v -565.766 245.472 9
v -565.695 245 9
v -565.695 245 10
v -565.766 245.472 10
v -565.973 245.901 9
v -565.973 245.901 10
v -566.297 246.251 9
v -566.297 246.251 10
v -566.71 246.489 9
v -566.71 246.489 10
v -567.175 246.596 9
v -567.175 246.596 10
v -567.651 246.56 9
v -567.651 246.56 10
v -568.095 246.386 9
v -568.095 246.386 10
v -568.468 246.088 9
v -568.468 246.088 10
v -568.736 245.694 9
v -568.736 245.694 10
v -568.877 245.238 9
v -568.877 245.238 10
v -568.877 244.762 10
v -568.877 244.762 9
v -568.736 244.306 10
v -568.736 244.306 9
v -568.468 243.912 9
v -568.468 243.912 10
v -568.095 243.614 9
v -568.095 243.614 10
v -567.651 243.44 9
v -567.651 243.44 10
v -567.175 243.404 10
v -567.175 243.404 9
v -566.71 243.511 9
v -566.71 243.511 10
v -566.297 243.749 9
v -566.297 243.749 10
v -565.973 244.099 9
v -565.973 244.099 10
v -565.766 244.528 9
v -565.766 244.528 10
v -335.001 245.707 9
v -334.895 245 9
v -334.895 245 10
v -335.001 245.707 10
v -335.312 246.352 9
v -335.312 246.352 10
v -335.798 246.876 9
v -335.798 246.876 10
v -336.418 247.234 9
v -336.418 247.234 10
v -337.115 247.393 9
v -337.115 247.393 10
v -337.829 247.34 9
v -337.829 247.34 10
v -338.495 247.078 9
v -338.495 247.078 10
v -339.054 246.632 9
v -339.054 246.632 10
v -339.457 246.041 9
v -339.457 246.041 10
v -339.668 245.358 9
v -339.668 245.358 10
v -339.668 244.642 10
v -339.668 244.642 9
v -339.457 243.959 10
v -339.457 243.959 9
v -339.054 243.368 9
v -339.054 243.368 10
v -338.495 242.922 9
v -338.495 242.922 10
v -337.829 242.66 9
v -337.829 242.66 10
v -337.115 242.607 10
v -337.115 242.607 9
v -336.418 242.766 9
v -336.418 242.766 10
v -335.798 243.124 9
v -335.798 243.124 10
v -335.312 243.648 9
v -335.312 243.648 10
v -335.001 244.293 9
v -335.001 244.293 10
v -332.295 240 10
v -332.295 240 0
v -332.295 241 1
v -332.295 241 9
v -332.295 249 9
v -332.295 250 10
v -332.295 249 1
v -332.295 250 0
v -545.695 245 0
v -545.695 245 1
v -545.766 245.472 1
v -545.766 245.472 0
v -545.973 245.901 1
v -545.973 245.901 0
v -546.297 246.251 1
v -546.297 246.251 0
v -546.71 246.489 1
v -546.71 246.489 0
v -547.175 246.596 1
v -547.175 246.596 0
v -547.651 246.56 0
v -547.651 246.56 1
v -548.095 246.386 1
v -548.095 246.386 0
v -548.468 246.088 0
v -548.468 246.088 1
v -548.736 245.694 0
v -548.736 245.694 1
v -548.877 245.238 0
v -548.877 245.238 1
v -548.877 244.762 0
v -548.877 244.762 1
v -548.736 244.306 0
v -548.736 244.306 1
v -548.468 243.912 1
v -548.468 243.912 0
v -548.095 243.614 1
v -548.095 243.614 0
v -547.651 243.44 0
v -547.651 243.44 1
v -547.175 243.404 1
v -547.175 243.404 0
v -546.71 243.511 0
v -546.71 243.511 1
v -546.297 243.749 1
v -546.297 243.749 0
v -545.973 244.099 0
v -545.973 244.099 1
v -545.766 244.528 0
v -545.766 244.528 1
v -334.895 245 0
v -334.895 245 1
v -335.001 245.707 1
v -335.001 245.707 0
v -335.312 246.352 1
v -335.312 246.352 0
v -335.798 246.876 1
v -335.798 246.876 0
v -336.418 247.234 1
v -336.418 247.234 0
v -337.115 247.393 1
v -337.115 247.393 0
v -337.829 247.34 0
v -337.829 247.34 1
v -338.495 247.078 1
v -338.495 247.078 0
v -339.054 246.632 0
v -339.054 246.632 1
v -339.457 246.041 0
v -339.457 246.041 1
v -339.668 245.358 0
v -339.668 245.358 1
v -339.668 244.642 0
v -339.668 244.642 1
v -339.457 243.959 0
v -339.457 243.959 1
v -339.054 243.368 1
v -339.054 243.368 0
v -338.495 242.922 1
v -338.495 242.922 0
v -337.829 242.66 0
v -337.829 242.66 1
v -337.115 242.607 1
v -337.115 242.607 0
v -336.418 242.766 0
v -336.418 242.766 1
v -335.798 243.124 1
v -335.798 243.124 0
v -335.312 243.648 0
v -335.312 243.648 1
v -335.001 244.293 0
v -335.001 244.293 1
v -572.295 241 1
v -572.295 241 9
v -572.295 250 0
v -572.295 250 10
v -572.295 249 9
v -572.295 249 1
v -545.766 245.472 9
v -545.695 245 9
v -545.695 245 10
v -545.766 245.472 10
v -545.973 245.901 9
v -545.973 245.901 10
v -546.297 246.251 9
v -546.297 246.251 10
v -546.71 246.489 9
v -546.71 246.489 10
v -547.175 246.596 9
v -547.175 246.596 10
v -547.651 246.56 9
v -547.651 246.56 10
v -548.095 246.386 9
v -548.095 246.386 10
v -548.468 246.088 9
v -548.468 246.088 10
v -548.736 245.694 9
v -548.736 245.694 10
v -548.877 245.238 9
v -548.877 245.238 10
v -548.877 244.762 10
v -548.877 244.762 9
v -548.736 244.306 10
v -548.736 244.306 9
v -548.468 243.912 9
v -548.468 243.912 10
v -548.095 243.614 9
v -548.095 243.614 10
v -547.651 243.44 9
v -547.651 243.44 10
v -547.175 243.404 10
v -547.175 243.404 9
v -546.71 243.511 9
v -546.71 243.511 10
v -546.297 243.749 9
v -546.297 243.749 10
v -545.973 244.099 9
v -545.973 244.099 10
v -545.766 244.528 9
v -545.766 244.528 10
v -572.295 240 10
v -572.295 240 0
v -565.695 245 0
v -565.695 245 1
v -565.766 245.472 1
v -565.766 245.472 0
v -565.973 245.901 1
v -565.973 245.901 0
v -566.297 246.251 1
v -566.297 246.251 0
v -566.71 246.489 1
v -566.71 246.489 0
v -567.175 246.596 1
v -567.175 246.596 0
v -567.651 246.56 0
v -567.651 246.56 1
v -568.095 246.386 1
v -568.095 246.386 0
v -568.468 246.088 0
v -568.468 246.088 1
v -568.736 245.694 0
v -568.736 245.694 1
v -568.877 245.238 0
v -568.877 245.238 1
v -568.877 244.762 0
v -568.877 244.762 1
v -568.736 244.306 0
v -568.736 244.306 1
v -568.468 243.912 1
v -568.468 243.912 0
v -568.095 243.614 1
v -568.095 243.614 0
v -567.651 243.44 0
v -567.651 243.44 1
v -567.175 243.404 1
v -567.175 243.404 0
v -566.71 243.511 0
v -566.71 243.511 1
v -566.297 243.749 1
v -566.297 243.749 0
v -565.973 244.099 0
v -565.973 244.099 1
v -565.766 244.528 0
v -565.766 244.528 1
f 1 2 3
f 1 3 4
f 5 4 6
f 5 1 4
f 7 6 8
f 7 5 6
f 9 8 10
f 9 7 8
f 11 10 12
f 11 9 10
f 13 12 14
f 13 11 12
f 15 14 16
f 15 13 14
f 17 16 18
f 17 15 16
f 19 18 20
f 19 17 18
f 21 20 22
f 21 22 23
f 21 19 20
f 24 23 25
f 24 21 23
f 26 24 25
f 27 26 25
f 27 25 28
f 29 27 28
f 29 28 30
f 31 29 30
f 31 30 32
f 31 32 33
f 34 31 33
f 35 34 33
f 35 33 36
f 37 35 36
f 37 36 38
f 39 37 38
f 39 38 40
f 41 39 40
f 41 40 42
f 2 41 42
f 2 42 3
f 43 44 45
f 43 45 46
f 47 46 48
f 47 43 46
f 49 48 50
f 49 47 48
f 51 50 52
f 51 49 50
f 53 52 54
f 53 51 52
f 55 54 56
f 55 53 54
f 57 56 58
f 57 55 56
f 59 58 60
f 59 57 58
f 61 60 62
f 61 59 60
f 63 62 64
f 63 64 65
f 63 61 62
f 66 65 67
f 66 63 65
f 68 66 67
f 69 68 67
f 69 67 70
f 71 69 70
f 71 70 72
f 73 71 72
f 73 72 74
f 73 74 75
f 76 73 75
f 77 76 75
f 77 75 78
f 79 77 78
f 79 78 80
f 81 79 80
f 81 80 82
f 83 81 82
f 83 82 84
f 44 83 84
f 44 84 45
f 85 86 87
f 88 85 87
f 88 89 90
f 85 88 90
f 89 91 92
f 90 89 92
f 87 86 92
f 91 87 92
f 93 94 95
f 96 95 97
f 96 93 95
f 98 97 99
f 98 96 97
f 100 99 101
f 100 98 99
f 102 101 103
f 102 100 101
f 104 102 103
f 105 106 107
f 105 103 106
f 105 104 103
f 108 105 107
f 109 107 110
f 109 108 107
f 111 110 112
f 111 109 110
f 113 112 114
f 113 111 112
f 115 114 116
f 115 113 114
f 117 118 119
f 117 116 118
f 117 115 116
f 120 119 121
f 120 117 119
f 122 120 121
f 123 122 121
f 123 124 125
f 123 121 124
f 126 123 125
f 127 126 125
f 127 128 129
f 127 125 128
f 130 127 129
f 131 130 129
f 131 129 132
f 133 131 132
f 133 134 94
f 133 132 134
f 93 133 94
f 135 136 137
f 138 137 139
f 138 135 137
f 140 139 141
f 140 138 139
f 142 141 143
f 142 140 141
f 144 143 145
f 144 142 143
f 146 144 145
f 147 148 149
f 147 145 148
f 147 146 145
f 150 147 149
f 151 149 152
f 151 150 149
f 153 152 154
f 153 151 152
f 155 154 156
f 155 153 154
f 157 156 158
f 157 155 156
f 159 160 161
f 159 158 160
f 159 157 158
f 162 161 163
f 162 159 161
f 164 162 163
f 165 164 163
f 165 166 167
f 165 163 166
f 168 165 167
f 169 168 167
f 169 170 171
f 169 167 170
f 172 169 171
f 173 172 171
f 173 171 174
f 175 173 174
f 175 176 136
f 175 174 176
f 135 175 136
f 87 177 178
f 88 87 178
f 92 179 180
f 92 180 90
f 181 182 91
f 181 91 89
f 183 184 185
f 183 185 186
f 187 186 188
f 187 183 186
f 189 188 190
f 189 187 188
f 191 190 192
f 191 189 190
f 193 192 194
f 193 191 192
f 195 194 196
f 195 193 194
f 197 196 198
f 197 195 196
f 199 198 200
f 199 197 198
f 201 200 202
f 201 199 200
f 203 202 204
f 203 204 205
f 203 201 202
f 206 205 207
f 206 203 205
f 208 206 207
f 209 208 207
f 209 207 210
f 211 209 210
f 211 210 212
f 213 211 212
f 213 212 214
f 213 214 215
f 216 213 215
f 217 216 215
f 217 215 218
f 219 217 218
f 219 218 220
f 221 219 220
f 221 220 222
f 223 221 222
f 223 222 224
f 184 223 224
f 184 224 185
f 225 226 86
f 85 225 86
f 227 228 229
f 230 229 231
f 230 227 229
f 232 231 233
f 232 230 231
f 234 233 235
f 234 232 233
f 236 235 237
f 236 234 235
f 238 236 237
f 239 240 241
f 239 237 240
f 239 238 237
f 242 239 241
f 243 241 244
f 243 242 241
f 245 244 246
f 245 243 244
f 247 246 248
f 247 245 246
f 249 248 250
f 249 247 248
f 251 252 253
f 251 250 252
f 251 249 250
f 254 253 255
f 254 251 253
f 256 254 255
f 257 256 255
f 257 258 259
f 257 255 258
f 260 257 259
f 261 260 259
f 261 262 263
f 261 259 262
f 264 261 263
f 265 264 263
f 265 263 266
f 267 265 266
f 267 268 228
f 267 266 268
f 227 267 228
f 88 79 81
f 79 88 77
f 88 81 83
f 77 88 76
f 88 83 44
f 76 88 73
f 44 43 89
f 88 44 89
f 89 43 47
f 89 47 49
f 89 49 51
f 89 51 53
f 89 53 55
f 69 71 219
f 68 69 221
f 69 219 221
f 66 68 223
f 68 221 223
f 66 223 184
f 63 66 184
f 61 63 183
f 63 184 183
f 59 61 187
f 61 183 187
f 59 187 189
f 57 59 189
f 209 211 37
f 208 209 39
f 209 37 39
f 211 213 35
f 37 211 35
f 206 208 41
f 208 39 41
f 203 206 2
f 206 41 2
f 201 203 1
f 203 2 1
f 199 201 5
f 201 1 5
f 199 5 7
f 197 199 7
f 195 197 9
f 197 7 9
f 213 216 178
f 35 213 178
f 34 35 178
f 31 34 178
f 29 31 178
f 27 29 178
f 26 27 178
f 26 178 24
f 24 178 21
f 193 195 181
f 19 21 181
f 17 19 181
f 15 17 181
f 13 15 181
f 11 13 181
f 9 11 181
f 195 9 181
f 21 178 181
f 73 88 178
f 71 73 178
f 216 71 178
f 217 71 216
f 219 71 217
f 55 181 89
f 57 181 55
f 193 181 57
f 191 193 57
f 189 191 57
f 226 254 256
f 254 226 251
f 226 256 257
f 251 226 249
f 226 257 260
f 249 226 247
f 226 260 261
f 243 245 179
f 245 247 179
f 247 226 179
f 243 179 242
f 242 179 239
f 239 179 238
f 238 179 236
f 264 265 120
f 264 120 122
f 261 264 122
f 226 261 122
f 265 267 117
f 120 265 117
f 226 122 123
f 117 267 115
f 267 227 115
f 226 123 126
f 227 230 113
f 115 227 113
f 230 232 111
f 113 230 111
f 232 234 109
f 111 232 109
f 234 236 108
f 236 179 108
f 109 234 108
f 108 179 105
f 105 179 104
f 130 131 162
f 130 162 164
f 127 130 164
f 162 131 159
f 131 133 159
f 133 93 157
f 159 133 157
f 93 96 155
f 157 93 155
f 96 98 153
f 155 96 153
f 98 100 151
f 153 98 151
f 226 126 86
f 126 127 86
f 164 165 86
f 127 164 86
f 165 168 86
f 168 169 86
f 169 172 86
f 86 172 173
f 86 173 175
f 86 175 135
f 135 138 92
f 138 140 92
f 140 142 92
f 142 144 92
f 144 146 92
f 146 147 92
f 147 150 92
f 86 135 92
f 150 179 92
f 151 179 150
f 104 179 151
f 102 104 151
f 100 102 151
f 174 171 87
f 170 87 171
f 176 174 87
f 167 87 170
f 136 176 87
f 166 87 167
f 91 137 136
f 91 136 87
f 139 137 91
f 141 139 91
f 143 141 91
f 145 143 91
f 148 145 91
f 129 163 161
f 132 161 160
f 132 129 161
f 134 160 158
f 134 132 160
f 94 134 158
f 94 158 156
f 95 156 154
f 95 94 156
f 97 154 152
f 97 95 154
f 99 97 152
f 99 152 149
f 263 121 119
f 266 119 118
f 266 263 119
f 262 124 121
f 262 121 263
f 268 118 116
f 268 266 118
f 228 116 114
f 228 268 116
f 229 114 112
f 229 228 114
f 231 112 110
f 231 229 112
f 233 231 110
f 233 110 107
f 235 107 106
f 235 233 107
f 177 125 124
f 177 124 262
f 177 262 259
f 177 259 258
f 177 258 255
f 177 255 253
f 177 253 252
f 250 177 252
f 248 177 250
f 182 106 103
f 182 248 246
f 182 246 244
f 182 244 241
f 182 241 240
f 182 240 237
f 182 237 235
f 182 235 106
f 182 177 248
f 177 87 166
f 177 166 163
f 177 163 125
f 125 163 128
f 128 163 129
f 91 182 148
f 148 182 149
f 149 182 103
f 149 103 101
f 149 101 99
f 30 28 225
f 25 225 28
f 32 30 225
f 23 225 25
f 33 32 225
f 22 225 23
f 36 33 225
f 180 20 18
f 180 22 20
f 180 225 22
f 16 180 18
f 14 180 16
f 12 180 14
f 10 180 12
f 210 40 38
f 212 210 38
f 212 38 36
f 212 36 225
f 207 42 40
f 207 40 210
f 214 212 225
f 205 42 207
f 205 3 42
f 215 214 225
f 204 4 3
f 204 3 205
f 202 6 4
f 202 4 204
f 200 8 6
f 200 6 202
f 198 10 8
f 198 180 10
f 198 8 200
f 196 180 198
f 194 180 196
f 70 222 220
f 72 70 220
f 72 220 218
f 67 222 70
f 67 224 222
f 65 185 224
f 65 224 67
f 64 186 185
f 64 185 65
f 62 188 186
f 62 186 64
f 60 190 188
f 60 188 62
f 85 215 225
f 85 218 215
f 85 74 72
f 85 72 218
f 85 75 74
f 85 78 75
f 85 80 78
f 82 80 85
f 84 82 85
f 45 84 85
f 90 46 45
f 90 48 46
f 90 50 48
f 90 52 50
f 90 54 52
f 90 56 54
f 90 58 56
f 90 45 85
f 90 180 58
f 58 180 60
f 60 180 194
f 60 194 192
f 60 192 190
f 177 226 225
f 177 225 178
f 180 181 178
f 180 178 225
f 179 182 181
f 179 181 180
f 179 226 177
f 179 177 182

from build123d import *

# Parameters (mm, degrees)
SKETCH_1_W          = 240
SKETCH_1_H          = 10
SKETCH_1_R          = 1.6
SKETCH_1_R_2        = 2.4
EXTRUDE_1_DEPTH     = 10
SKETCH_2_W          = 8
SKETCH_2_H          = 8
CUT_EXTRUDE_1_DEPTH = 347.698716467


with BuildPart() as part:
    # ｽｹｯﾁ1 → ﾎﾞｽ - 押し出し1 (new body)
    with BuildSketch(Plane.XY):
        with Locations((-452.2947342, 245)):
            Rectangle(SKETCH_1_W, SKETCH_1_H)
        with Locations((-567.2947342, 244.999999998)):
            Circle(SKETCH_1_R, mode=Mode.SUBTRACT)
        with Locations((-547.2947342, 244.999999998)):
            Circle(SKETCH_1_R, mode=Mode.SUBTRACT)
        with Locations((-337.2947342, 245)):
            Circle(SKETCH_1_R_2, mode=Mode.SUBTRACT)
    extrude(amount=EXTRUDE_1_DEPTH)

    # ｽｹｯﾁ2 → ｶｯﾄ - 押し出し1 (cut, through all)
    with BuildSketch(Plane.ZY.offset(572.2947342)):
        with Locations((5, 245)):
            Rectangle(SKETCH_2_W, SKETCH_2_H)
    extrude(amount=-CUT_EXTRUDE_1_DEPTH, mode=Mode.SUBTRACT)


solid = part.part
